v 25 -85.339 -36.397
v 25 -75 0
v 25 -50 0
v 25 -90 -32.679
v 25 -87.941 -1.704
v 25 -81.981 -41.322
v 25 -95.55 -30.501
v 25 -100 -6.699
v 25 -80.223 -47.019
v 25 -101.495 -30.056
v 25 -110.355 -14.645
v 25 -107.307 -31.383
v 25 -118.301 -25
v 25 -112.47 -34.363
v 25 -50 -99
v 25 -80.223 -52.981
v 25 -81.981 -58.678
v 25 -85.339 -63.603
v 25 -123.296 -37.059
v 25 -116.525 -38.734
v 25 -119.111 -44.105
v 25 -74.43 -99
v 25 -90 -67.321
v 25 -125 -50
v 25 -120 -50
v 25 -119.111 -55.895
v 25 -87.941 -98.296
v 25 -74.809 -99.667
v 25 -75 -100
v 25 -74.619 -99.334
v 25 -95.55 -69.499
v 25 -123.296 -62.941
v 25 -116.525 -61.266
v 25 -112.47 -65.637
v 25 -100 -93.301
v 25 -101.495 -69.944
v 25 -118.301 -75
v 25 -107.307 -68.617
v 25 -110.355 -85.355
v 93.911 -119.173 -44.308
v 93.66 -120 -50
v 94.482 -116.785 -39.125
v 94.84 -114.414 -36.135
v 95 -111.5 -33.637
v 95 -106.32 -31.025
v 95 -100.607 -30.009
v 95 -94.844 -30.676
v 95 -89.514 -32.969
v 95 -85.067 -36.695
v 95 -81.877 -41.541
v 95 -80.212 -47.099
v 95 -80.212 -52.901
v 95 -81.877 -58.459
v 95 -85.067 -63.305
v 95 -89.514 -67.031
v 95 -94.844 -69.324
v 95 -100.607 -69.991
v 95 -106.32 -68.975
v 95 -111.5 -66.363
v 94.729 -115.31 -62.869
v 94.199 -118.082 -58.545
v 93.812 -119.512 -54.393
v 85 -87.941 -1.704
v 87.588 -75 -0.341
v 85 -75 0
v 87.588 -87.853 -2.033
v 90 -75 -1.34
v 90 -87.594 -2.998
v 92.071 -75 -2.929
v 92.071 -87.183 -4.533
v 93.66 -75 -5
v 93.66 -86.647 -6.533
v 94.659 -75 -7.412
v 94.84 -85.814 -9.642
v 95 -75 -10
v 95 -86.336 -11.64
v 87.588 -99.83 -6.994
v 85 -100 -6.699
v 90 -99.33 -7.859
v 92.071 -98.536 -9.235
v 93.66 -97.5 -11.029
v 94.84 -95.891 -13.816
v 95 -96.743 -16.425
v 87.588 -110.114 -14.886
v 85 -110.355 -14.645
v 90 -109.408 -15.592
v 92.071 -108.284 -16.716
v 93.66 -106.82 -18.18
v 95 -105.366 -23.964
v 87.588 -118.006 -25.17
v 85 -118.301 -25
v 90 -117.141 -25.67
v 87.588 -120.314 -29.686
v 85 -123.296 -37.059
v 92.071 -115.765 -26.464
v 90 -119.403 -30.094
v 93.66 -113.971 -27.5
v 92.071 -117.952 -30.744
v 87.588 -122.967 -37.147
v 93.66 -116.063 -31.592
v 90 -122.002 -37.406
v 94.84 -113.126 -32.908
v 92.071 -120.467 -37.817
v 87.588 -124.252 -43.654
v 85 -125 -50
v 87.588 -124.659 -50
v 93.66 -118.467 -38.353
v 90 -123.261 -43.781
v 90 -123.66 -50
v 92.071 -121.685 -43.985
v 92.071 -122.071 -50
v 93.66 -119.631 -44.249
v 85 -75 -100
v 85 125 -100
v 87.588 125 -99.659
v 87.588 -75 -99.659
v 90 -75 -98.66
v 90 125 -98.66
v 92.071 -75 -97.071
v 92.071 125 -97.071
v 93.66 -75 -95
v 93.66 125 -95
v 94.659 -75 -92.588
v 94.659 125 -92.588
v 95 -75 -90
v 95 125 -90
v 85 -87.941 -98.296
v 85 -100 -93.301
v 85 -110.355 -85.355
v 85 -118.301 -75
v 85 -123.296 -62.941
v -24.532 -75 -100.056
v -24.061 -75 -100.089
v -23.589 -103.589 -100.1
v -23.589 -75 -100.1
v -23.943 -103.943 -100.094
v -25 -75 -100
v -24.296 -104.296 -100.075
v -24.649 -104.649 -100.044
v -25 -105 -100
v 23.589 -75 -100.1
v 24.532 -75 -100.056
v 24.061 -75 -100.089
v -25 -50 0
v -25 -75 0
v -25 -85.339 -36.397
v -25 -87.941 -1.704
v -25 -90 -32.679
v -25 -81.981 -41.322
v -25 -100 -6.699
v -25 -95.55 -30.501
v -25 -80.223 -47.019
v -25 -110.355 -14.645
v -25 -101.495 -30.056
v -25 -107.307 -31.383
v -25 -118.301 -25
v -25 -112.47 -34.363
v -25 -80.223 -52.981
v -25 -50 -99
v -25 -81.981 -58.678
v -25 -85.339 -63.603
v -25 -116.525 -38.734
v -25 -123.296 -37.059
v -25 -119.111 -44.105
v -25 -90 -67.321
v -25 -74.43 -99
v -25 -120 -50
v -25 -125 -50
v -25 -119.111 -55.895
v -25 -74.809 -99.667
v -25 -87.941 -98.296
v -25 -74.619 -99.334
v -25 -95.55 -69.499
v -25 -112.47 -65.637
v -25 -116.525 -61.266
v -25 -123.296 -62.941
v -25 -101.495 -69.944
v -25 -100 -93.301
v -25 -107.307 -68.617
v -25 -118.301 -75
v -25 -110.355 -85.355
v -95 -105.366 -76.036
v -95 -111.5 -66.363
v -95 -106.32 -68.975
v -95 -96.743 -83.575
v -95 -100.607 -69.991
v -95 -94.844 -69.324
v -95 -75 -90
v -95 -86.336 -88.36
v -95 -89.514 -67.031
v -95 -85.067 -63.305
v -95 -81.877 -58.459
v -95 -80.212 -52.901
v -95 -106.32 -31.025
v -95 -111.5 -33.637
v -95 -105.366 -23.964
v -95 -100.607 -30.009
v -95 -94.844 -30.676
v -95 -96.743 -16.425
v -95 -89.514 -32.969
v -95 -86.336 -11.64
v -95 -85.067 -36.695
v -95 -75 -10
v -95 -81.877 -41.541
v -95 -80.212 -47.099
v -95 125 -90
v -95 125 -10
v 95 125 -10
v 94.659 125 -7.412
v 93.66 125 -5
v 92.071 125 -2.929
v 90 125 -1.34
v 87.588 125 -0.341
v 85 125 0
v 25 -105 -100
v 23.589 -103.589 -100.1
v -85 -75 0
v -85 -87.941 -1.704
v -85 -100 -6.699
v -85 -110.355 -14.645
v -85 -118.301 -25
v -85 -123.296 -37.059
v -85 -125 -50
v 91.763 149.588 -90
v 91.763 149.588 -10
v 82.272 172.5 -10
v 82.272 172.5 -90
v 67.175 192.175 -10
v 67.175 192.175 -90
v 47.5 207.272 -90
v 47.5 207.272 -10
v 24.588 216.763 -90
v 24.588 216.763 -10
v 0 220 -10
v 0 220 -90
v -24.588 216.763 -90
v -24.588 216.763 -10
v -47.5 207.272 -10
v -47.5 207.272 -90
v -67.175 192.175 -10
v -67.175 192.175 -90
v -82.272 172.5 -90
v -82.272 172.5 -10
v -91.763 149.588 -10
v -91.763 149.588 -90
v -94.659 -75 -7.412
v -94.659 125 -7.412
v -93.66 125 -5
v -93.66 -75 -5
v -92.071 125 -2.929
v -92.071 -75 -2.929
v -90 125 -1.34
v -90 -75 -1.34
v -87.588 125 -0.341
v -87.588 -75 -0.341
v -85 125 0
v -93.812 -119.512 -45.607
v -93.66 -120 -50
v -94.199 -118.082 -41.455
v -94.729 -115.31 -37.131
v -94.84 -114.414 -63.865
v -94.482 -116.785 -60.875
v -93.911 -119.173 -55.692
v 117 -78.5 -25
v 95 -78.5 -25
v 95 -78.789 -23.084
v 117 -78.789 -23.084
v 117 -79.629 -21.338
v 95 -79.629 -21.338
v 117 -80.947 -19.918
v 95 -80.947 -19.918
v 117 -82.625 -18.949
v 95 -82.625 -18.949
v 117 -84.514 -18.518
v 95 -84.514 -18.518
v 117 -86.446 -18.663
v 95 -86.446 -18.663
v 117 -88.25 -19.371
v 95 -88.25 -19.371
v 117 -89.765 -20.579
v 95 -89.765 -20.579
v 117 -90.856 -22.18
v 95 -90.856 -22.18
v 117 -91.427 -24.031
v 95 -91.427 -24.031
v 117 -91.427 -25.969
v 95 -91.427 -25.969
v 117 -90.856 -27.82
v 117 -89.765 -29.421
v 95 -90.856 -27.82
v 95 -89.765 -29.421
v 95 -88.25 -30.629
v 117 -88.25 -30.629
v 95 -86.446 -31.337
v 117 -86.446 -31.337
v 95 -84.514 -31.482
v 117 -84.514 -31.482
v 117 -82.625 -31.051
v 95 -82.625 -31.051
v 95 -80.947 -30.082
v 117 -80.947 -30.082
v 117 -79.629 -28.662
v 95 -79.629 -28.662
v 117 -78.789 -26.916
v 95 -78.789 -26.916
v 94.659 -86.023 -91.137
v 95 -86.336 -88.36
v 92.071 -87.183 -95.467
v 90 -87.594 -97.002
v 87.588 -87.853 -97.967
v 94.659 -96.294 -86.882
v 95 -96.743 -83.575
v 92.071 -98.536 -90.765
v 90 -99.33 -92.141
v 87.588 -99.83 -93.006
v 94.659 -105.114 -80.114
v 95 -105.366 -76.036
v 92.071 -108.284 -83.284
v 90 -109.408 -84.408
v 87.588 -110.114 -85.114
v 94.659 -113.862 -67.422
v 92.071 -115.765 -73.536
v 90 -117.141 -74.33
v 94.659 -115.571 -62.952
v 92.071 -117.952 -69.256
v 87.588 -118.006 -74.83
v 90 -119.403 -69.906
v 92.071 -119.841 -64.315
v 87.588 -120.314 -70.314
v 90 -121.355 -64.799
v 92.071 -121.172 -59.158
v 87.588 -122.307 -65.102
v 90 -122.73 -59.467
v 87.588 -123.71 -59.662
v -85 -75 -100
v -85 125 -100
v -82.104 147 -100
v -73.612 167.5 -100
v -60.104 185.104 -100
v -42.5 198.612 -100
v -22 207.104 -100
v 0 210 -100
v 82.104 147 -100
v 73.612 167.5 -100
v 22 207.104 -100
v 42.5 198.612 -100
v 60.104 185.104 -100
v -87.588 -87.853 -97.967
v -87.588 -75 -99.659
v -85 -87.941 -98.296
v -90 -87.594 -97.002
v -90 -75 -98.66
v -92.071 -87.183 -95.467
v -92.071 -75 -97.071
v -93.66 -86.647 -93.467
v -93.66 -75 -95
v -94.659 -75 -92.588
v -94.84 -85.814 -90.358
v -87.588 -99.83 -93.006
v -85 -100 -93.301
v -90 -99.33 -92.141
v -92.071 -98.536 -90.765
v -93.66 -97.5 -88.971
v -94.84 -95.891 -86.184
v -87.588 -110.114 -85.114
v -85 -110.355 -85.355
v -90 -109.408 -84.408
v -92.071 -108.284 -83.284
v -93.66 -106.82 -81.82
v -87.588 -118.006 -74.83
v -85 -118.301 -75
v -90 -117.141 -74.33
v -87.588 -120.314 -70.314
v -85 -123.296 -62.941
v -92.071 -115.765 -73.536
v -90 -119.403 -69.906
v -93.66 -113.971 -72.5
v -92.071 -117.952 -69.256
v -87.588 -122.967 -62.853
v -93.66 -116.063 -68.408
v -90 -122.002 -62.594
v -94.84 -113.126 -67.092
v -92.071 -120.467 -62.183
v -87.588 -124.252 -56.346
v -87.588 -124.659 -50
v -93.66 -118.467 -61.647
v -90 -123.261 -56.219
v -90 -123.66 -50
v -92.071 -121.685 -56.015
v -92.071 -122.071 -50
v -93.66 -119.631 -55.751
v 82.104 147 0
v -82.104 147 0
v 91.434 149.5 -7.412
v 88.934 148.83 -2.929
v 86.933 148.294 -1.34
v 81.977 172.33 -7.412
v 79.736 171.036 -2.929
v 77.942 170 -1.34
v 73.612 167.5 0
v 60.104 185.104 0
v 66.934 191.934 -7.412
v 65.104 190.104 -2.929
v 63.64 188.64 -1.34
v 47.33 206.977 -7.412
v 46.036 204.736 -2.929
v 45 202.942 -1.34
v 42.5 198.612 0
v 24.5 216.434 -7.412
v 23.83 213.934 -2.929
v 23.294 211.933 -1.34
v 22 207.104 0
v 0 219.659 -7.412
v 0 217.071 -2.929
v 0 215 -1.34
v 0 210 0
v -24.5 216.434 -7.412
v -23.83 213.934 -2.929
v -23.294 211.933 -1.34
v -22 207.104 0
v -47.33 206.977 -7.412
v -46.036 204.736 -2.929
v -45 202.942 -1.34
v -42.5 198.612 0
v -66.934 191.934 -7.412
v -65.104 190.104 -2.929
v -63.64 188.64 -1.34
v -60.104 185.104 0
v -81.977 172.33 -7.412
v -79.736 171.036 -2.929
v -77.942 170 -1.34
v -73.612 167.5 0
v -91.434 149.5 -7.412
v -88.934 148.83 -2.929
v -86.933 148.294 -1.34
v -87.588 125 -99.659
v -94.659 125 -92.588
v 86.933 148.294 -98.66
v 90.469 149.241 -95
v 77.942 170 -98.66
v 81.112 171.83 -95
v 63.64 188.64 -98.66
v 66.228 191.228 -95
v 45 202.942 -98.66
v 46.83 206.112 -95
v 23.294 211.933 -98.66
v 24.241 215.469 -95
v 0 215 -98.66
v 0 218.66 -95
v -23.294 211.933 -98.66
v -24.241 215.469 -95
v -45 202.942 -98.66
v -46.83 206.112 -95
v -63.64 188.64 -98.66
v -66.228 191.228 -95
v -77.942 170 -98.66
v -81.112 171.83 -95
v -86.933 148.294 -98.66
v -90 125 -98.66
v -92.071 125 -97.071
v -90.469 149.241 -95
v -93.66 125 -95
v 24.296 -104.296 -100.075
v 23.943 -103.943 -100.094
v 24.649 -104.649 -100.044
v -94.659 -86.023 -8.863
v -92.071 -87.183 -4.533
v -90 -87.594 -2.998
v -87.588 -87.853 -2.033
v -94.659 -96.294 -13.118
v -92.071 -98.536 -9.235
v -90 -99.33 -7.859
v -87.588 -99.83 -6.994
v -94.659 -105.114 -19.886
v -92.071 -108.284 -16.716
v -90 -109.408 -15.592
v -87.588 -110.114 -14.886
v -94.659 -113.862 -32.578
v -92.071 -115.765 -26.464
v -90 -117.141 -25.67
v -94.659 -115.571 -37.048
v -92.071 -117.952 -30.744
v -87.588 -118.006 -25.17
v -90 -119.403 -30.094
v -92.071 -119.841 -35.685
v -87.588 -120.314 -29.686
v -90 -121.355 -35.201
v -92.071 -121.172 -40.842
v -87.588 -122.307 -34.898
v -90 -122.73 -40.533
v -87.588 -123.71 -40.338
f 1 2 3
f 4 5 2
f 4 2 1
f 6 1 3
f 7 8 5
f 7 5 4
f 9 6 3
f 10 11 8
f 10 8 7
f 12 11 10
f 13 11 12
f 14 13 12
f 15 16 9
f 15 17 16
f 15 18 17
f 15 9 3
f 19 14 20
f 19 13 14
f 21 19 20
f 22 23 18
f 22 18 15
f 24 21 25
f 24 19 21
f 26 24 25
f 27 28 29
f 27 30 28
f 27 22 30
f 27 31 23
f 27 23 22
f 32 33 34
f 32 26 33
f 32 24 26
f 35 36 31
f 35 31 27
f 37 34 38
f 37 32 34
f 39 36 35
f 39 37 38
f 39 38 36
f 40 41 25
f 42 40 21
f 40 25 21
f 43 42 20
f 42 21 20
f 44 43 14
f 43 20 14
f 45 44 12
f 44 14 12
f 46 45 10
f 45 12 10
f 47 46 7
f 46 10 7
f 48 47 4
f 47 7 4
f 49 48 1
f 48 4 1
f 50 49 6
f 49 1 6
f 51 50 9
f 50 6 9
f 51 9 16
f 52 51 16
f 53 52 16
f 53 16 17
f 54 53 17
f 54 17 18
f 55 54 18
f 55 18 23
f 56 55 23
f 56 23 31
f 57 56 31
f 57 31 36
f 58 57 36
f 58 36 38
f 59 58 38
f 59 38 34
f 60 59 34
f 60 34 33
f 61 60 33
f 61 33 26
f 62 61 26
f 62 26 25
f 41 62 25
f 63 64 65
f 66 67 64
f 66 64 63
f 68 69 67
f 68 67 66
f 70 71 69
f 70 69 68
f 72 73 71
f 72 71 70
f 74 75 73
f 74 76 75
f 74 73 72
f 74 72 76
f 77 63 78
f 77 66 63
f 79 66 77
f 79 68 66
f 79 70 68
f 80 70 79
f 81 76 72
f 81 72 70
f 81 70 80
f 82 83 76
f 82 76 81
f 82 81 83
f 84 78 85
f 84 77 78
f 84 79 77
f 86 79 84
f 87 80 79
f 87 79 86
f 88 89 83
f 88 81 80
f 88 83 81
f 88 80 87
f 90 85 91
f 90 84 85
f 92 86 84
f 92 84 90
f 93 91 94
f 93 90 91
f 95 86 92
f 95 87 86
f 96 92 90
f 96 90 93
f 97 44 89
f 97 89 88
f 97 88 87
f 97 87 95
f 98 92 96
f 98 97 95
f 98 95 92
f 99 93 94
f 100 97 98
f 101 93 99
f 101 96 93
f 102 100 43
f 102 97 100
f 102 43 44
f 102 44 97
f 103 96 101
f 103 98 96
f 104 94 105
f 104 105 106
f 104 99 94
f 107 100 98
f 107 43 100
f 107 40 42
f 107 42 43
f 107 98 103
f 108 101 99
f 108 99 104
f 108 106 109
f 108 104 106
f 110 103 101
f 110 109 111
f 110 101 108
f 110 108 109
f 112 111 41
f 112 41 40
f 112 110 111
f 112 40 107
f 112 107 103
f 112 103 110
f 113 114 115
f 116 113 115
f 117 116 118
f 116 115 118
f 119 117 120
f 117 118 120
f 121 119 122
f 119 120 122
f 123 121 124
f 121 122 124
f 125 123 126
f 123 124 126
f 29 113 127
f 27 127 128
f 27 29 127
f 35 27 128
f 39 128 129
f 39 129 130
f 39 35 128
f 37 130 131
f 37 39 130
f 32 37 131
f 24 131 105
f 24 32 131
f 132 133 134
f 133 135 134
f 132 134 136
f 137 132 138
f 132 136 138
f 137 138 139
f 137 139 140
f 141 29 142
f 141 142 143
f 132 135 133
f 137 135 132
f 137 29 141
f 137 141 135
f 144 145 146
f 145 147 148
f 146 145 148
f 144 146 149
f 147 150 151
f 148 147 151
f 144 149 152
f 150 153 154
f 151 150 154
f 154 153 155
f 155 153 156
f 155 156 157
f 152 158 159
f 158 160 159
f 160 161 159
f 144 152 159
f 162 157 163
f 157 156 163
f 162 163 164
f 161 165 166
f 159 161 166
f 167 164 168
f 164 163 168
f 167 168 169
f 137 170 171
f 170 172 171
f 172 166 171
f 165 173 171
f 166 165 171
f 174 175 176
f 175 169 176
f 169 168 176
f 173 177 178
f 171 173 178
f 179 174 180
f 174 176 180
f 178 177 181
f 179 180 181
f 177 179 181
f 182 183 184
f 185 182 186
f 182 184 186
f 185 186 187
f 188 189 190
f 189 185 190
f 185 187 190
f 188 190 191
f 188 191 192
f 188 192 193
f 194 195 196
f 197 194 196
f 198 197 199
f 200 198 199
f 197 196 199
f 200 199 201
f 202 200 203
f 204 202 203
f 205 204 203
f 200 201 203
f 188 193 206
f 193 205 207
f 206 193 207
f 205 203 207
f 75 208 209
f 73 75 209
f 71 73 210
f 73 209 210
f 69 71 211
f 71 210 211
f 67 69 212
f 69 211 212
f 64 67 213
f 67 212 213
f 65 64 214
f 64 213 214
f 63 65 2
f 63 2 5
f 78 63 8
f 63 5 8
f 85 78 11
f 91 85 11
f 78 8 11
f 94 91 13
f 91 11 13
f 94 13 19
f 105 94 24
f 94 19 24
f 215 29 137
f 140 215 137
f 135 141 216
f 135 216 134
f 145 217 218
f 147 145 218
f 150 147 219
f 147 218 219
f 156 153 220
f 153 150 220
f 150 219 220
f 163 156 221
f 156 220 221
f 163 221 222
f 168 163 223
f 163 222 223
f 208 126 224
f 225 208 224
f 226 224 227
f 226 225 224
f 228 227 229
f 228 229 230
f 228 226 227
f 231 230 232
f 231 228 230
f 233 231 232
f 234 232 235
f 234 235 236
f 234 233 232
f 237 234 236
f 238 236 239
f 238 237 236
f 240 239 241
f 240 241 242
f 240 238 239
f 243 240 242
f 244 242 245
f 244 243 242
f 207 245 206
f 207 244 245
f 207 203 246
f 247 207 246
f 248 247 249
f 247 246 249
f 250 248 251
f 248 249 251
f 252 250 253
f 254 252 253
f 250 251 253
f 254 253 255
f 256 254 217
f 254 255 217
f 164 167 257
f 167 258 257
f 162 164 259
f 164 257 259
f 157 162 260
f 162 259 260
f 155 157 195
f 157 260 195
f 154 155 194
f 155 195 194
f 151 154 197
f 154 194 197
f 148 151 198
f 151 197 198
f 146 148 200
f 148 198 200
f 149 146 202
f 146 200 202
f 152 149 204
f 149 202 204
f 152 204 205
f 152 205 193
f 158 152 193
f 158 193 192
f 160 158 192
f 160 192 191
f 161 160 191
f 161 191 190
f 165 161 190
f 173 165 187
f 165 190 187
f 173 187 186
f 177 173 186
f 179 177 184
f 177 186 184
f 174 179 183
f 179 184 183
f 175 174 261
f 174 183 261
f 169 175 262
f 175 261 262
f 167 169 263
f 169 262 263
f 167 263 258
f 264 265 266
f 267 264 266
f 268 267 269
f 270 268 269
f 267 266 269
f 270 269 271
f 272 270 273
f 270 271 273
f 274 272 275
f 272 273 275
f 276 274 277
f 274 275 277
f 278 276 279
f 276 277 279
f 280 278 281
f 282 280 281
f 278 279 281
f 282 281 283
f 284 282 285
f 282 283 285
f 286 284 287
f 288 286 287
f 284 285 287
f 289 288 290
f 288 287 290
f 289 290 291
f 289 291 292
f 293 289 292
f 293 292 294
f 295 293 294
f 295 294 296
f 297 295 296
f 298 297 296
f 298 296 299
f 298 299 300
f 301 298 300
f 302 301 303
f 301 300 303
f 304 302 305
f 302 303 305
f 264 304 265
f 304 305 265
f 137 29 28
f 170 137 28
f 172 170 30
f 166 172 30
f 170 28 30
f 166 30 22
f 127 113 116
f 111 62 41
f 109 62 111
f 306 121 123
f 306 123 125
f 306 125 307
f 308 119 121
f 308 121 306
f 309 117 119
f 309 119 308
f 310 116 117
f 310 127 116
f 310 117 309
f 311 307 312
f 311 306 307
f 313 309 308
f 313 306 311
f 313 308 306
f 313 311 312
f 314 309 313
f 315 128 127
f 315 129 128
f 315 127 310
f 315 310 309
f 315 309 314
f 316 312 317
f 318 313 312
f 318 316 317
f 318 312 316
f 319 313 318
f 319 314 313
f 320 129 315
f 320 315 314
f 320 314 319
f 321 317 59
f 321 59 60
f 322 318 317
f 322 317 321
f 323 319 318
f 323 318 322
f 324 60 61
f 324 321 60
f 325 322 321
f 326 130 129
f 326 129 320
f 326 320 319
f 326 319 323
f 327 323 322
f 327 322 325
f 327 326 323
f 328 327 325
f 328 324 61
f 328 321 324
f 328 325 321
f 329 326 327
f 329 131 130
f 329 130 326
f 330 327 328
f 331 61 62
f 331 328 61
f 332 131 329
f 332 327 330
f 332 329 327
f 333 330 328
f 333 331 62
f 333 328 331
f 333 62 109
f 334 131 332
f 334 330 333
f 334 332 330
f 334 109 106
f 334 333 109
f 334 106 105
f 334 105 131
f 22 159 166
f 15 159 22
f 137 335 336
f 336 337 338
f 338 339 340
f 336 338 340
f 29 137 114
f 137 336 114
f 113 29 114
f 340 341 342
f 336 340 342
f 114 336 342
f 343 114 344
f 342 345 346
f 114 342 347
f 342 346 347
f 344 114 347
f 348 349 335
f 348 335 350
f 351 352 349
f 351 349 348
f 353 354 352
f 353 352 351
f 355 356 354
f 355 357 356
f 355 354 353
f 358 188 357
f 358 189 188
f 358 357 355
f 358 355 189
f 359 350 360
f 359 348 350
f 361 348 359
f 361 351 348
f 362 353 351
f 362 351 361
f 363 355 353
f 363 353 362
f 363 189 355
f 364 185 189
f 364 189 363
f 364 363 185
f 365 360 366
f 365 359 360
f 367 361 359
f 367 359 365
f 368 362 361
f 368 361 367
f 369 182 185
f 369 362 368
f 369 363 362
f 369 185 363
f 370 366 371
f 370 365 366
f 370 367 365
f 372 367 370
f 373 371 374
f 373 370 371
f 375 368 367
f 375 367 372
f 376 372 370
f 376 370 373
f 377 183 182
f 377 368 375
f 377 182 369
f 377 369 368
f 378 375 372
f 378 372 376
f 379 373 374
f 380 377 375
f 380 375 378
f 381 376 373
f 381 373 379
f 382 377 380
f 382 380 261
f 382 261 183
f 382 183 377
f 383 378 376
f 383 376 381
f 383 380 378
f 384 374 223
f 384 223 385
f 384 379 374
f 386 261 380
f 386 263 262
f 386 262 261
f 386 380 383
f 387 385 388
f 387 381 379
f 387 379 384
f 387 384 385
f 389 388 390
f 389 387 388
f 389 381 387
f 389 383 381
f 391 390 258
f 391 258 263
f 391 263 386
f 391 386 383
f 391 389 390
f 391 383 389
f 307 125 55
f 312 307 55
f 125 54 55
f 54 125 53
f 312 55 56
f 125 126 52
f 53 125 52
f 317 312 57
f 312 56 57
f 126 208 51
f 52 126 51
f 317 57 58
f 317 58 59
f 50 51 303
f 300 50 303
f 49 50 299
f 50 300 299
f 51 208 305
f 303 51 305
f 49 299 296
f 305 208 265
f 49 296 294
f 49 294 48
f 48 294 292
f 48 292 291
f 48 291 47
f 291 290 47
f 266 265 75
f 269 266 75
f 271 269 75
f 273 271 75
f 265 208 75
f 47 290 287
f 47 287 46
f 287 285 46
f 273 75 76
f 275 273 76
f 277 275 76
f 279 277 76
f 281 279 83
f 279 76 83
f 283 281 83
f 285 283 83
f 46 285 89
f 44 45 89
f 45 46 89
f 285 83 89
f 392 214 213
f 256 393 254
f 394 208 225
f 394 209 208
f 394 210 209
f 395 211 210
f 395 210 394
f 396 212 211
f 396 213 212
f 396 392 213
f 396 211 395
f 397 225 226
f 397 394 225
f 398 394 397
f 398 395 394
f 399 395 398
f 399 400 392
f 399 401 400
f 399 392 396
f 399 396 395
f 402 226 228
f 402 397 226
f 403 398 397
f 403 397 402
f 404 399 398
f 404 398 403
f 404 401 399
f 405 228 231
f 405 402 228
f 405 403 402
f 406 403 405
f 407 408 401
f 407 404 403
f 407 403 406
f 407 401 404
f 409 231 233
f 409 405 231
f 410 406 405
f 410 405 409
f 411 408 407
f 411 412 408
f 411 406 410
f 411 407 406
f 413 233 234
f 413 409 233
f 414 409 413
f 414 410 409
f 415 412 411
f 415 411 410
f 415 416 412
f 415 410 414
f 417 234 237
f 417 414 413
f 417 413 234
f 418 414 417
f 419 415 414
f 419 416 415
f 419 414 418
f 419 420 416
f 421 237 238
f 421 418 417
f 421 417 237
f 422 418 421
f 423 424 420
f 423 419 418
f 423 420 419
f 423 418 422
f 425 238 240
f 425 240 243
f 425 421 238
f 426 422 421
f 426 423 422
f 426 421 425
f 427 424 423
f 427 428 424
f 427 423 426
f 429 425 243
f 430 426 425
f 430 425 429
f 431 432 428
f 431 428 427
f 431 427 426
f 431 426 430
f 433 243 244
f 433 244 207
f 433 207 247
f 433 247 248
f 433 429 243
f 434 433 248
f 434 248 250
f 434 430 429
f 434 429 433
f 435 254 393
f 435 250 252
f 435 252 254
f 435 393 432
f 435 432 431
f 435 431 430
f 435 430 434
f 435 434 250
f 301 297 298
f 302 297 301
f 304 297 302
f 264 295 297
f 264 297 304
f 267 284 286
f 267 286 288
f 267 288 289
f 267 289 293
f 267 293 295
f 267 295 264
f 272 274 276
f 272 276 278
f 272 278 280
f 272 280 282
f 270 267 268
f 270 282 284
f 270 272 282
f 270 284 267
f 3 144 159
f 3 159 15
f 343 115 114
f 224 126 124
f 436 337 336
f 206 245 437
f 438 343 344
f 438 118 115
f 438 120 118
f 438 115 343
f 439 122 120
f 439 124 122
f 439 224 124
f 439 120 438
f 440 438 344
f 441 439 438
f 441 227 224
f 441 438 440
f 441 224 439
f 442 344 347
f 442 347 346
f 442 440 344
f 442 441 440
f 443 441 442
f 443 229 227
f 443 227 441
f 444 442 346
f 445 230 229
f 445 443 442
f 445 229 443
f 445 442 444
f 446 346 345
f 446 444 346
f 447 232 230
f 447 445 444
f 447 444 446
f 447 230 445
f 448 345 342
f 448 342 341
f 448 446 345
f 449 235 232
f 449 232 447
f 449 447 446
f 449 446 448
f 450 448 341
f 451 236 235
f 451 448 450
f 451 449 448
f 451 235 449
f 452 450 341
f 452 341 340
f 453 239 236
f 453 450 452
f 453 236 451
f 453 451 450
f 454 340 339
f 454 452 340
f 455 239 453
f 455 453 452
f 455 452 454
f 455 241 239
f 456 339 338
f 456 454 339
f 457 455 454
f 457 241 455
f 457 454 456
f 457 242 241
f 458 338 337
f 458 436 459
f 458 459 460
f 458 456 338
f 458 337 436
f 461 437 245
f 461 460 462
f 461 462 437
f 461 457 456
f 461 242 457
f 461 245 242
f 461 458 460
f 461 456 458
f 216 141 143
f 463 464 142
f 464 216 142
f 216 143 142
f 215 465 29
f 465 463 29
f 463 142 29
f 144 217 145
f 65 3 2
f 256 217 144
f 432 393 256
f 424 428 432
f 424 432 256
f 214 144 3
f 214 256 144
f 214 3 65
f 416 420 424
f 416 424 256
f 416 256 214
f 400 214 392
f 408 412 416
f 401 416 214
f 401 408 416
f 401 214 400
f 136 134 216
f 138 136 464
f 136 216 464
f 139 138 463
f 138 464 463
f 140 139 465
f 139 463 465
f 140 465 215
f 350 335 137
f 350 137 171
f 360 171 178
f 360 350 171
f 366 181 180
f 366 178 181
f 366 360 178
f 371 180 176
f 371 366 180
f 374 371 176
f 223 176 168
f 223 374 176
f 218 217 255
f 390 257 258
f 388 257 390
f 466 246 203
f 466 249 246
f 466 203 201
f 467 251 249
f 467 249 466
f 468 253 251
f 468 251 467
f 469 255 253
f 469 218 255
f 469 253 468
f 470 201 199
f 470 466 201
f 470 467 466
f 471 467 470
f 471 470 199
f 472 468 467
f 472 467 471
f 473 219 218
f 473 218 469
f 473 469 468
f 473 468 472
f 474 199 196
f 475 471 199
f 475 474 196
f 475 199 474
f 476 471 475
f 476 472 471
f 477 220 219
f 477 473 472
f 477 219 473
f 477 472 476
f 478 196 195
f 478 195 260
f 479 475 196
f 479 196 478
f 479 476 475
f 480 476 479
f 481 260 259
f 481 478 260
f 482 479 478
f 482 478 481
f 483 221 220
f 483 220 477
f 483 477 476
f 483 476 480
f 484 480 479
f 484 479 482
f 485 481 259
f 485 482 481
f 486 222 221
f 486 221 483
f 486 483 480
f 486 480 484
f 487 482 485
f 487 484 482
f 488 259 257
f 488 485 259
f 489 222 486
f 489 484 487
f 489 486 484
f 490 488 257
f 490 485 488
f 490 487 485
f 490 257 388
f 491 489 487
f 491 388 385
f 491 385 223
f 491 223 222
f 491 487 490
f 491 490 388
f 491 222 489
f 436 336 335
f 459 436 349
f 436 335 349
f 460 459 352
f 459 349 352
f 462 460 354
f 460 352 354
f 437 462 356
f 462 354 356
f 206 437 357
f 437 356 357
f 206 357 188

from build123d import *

# Parameters (mm, degrees)
BOSS_EXTRUDE1_DEPTH    = 100
SKETCH2_W              = 50
SKETCH2_H              = 50
CUT_EXTRUDE1_DEPTH     = 187.14510469
CUT_EXTRUDE2_DEPTH     = 25
SKETCH7_R              = 20
CUT_EXTRUDE3_DEPTH     = 249.445164976
FILLET2_R              = 50
CUT_EXTRUDE6_START     = -125
CUT_EXTRUDE6_OUTLINE_W = 50
CUT_EXTRUDE6_OUTLINE_H = 6.698729811
CUT_EXTRUDE6_DEPTH     = 50
CUT_EXTRUDE7_DEPTH     = 25
BOSS_EXTRUDE2_DEPTH    = 100
FILLET4_R              = 10
SKETCH11_W             = 50
SKETCH11_H             = 25
CUT_EXTRUDE11_DEPTH    = 99
SKETCH16_W             = 50
SKETCH16_H             = 30
BOSS_EXTRUDE3_DEPTH    = 0.1
FILLET5_R              = 10
SKETCH17_R             = 6.5
BOSS_EXTRUDE4_DEPTH    = 22


with BuildPart() as part:
    # Sketch1 → Boss-Extrude1 (new body)
    with BuildSketch(Plane.XY):
        Polygon((-95, 125), (20.2, 125), (69.8, 125), (95, 125), (95, -125), (-95, -125), align=None)
    extrude(amount=-BOSS_EXTRUDE1_DEPTH)

    # Sketch2 → Cut-Extrude1 (cut, through all)
    with BuildSketch(Plane.XY):
        with Locations((0, -125)):
            Rectangle(SKETCH2_W, SKETCH2_H)
    extrude(amount=-CUT_EXTRUDE1_DEPTH, mode=Mode.SUBTRACT)

    # Sketch6 → Cut-Extrude2 (cut, symmetric)
    with BuildSketch(Plane(origin=(0, 0, 0), x_dir=(0, 0, -1), z_dir=(1, 0, 0))):
        with BuildLine():
            Line((100, -100), (0, -100))
            ThreePointArc((0, -100), (50, -50), (100, -100))
        make_face()
    extrude(amount=CUT_EXTRUDE2_DEPTH, both=True, mode=Mode.SUBTRACT)

    # Sketch7 → Cut-Extrude3 (cut, through all)
    with BuildSketch(Plane.ZY.offset(95)):
        with Locations(Location((-50, -100, 0), (0, 0, 270))):
            Circle(SKETCH7_R)
    extrude(amount=-CUT_EXTRUDE3_DEPTH, mode=Mode.SUBTRACT)

    # Fillet2
    fillet2_edges = [part.edges().sort_by_distance(p)[0] for p in [
        (-60, -125, -100),
        (-60, -125, 0),
    ]]
    fillet(fillet2_edges, radius=FILLET2_R - 0.0001)  # a hair under: the kernel refuses the full size

    # Cut-Extrude6: read off the stored shape, not the designer's step
    # Cut-Extrude6 outline → Cut-Extrude6 (cut)
    with BuildSketch(Plane(origin=(0, 0, 0), x_dir=(1, 0, 0), z_dir=(0, 1, 0)).offset(CUT_EXTRUDE6_START)):
        with Locations((0, 96.650635095)):
            Rectangle(CUT_EXTRUDE6_OUTLINE_W, CUT_EXTRUDE6_OUTLINE_H)
        with Locations((0, 3.349364906)):
            Rectangle(CUT_EXTRUDE6_OUTLINE_W, CUT_EXTRUDE6_OUTLINE_H)
    extrude(amount=CUT_EXTRUDE6_DEPTH, mode=Mode.SUBTRACT)

    # Sketch10 → Cut-Extrude7 (cut, symmetric)
    with BuildSketch(Plane(origin=(0, 0, 0), x_dir=(0, 0, -1), z_dir=(1, 0, 0))):
        with BuildLine():
            Line((0, -75), (100, -75))
            ThreePointArc((100, -75), (50, -61.602540378), (0, -75))
        make_face()
    extrude(amount=CUT_EXTRUDE7_DEPTH, both=True, mode=Mode.SUBTRACT)

    # Sketch15 → Boss-Extrude2 (add)
    with BuildSketch(Plane.XY):
        with BuildLine():
            Line((-95, 125), (95, 125))
            ThreePointArc((95, 125), (0, 220), (-95, 125))
        make_face()
    extrude(amount=-BOSS_EXTRUDE2_DEPTH)

    # Fillet4
    # the kernel refuses this fillet: 10 mm, written as the material it takes off along each edge
    with BuildSketch(Plane(origin=(0, 125, -100), x_dir=(1, 0, 0), z_dir=(0, -1, 0))) as fillet4_piece_1:
        with BuildLine():
            CenterArc((95 - FILLET4_R, FILLET4_R), FILLET4_R, 270, 90)
            Line((95, FILLET4_R), (95, 0))
            Line((95, 0), (95 - FILLET4_R, 0))
        make_face()
    revolve(axis=Axis((0, 125, -100), (0, 0, 1)), revolution_arc=180, mode=Mode.SUBTRACT)
    with BuildSketch(Plane(origin=(0, 125, 0), x_dir=(1, 0, 0), z_dir=(0, -1, 0))) as fillet4_piece_2:
        with BuildLine():
            CenterArc((95 - FILLET4_R, -FILLET4_R), FILLET4_R, 0, 90)
            Line((95, -FILLET4_R), (95, 0))
            Line((95, 0), (95 - FILLET4_R, 0))
        make_face()
    revolve(axis=Axis((0, 125, 0), (0, 0, 1)), revolution_arc=180, mode=Mode.SUBTRACT)
    with BuildSketch(Plane(origin=(-95, -75.0001, -100), x_dir=(0, 0, 1), z_dir=(0, 1, 0)), Plane(origin=(95, 125, 0), x_dir=(-1, 0, 0), z_dir=(0, -1, 0))) as fillet4_piece_3:
        with BuildLine():
            CenterArc((FILLET4_R, FILLET4_R), FILLET4_R, 180, 90)
            Line((0, FILLET4_R), (0, 0))
            Line((0, 0), (FILLET4_R, 0))
        make_face()
    extrude(amount=200.0001, mode=Mode.SUBTRACT)
    with BuildSketch(Plane(origin=(95, 125, -100), x_dir=(-1, 0, 0), z_dir=(0, -1, 0)), Plane(origin=(-95, -75.0001, 0), x_dir=(0, 0, -1), z_dir=(0, 1, 0))) as fillet4_piece_4:
        with BuildLine():
            CenterArc((FILLET4_R, -FILLET4_R), FILLET4_R, 90, 90)
            Line((0, -FILLET4_R), (0, 0))
            Line((0, 0), (FILLET4_R, 0))
        make_face()
    extrude(amount=200.0001, mode=Mode.SUBTRACT)
    with BuildSketch(Plane(origin=(95, -75.0001, -49.9999), x_dir=(0, 0, 1), z_dir=(0, 1, 0))) as fillet4_piece_5:
        with BuildLine():
            CenterArc((49.9999 - FILLET4_R, -FILLET4_R), FILLET4_R, 0, 90)
            Line((49.9999 - FILLET4_R, 0), (49.9999, 0))
            Line((49.9999, 0), (49.9999, -FILLET4_R))
        make_face()
    revolve(axis=Axis((95, -75.0001, -49.9999), (1, 0, 0)), revolution_arc=90, mode=Mode.SUBTRACT)
    with BuildSketch(Plane(origin=(95, -75.0001, -50.0001), x_dir=(0, 0, -1), z_dir=(0, 1, 0))) as fillet4_piece_6:
        with BuildLine():
            CenterArc((49.9999 - FILLET4_R, FILLET4_R), FILLET4_R, 270, 90)
            Line((49.9999, FILLET4_R), (49.9999, 0))
            Line((49.9999, 0), (49.9999 - FILLET4_R, 0))
        make_face()
    revolve(axis=Axis((95, -75.0001, -50.0001), (-1, 0, 0)), revolution_arc=90, mode=Mode.SUBTRACT)
    with BuildSketch(Plane(origin=(-95, -75.0001, -49.9999), x_dir=(0, 0, 1), z_dir=(0, 1, 0))) as fillet4_piece_7:
        with BuildLine():
            CenterArc((49.9999 - FILLET4_R, FILLET4_R), FILLET4_R, 270, 90)
            Line((49.9999, FILLET4_R), (49.9999, 0))
            Line((49.9999, 0), (49.9999 - FILLET4_R, 0))
        make_face()
    revolve(axis=Axis((-95, -75.0001, -49.9999), (1, 0, 0)), revolution_arc=90, mode=Mode.SUBTRACT)
    with BuildSketch(Plane(origin=(-95, -75.0001, -50.0001), x_dir=(0, 0, -1), z_dir=(0, 1, 0))) as fillet4_piece_8:
        with BuildLine():
            CenterArc((49.9999 - FILLET4_R, -FILLET4_R), FILLET4_R, 0, 90)
            Line((49.9999, -FILLET4_R), (49.9999, 0))
            Line((49.9999, 0), (49.9999 - FILLET4_R, 0))
        make_face()
    revolve(axis=Axis((-95, -75.0001, -50.0001), (-1, 0, 0)), revolution_arc=90, mode=Mode.SUBTRACT)
    with BuildSketch(Plane(origin=(-95, -125, -49.9999), x_dir=(0, 1, 0), z_dir=(0, 0, -1))) as fillet4_piece_9:
        with BuildLine():
            CenterArc((FILLET4_R, FILLET4_R), FILLET4_R, 180, 90)
            Line((0, FILLET4_R), (0, 0))
            Line((0, 0), (FILLET4_R, 0))
        make_face()
    extrude(amount=0.0002, mode=Mode.SUBTRACT)
    with BuildSketch(Plane(origin=(95, -125, -49.9999), x_dir=(0, 1, 0), z_dir=(0, 0, -1))) as fillet4_piece_10:
        with BuildLine():
            CenterArc((FILLET4_R, -FILLET4_R), FILLET4_R, 90, 90)
            Line((0, -FILLET4_R), (0, 0))
            Line((0, 0), (FILLET4_R, 0))
        make_face()
    extrude(amount=0.0002, mode=Mode.SUBTRACT)

    # Sketch11 → Cut-Extrude11 (cut)
    with BuildSketch(Plane.XY):
        with Locations((0, -62.5)):
            Rectangle(SKETCH11_W, SKETCH11_H)
    extrude(amount=-CUT_EXTRUDE11_DEPTH, mode=Mode.SUBTRACT)

    # Sketch17 → Boss-Extrude4 (add)
    with BuildSketch(Plane(origin=(95, 0, 0), x_dir=(0, 0, -1), z_dir=(1, 0, 0))):
        with Locations(Location((25, -85, 0), (0, 0, 90))):
            Circle(SKETCH17_R)
    extrude(amount=BOSS_EXTRUDE4_DEPTH)


with BuildPart() as body_2:
    # Sketch16 → Boss-Extrude3 (new body)
    with BuildSketch(Plane(origin=(0, 0, -100), x_dir=(-1, 0, 0), z_dir=(0, 0, -1))):
        with Locations((0, -90)):
            Rectangle(SKETCH16_W, SKETCH16_H)
    extrude(amount=BOSS_EXTRUDE3_DEPTH)

    # Fillet5
    # the kernel refuses this fillet: 10 mm, written as the material it takes off along each edge
    with BuildSketch(Plane(origin=(25, -71.473316005, -100.1), x_dir=(0, 0, 1), z_dir=(0, -1, 0)), Plane(origin=(-25, -108.526683995, -100.1), x_dir=(0, 0, 1), z_dir=(0, 1, 0))) as fillet5_piece_1:
        with BuildLine():
            CenterArc((10, 1.410673598), FILLET5_R, 180, 8.109614456)
            Line((0, 1.410673598), (0, 0))
            Line((0, 0), (0.1, 0))
        make_face()
    extrude(amount=37.05336799, mode=Mode.SUBTRACT)
    with BuildSketch(Plane(origin=(28.526683995, -105, -100.1), x_dir=(0, 0, 1), z_dir=(-1, 0, 0))) as fillet5_piece_2:
        with BuildLine():
            CenterArc((10, 1.410673598), FILLET5_R, 180, 8.109614456)
            Line((0, 1.410673598), (0, 0))
            Line((0, 0), (0.1, 0))
        make_face()
    extrude(amount=57.05336799, mode=Mode.SUBTRACT)


solid = Compound([part.part, body_2.part])
